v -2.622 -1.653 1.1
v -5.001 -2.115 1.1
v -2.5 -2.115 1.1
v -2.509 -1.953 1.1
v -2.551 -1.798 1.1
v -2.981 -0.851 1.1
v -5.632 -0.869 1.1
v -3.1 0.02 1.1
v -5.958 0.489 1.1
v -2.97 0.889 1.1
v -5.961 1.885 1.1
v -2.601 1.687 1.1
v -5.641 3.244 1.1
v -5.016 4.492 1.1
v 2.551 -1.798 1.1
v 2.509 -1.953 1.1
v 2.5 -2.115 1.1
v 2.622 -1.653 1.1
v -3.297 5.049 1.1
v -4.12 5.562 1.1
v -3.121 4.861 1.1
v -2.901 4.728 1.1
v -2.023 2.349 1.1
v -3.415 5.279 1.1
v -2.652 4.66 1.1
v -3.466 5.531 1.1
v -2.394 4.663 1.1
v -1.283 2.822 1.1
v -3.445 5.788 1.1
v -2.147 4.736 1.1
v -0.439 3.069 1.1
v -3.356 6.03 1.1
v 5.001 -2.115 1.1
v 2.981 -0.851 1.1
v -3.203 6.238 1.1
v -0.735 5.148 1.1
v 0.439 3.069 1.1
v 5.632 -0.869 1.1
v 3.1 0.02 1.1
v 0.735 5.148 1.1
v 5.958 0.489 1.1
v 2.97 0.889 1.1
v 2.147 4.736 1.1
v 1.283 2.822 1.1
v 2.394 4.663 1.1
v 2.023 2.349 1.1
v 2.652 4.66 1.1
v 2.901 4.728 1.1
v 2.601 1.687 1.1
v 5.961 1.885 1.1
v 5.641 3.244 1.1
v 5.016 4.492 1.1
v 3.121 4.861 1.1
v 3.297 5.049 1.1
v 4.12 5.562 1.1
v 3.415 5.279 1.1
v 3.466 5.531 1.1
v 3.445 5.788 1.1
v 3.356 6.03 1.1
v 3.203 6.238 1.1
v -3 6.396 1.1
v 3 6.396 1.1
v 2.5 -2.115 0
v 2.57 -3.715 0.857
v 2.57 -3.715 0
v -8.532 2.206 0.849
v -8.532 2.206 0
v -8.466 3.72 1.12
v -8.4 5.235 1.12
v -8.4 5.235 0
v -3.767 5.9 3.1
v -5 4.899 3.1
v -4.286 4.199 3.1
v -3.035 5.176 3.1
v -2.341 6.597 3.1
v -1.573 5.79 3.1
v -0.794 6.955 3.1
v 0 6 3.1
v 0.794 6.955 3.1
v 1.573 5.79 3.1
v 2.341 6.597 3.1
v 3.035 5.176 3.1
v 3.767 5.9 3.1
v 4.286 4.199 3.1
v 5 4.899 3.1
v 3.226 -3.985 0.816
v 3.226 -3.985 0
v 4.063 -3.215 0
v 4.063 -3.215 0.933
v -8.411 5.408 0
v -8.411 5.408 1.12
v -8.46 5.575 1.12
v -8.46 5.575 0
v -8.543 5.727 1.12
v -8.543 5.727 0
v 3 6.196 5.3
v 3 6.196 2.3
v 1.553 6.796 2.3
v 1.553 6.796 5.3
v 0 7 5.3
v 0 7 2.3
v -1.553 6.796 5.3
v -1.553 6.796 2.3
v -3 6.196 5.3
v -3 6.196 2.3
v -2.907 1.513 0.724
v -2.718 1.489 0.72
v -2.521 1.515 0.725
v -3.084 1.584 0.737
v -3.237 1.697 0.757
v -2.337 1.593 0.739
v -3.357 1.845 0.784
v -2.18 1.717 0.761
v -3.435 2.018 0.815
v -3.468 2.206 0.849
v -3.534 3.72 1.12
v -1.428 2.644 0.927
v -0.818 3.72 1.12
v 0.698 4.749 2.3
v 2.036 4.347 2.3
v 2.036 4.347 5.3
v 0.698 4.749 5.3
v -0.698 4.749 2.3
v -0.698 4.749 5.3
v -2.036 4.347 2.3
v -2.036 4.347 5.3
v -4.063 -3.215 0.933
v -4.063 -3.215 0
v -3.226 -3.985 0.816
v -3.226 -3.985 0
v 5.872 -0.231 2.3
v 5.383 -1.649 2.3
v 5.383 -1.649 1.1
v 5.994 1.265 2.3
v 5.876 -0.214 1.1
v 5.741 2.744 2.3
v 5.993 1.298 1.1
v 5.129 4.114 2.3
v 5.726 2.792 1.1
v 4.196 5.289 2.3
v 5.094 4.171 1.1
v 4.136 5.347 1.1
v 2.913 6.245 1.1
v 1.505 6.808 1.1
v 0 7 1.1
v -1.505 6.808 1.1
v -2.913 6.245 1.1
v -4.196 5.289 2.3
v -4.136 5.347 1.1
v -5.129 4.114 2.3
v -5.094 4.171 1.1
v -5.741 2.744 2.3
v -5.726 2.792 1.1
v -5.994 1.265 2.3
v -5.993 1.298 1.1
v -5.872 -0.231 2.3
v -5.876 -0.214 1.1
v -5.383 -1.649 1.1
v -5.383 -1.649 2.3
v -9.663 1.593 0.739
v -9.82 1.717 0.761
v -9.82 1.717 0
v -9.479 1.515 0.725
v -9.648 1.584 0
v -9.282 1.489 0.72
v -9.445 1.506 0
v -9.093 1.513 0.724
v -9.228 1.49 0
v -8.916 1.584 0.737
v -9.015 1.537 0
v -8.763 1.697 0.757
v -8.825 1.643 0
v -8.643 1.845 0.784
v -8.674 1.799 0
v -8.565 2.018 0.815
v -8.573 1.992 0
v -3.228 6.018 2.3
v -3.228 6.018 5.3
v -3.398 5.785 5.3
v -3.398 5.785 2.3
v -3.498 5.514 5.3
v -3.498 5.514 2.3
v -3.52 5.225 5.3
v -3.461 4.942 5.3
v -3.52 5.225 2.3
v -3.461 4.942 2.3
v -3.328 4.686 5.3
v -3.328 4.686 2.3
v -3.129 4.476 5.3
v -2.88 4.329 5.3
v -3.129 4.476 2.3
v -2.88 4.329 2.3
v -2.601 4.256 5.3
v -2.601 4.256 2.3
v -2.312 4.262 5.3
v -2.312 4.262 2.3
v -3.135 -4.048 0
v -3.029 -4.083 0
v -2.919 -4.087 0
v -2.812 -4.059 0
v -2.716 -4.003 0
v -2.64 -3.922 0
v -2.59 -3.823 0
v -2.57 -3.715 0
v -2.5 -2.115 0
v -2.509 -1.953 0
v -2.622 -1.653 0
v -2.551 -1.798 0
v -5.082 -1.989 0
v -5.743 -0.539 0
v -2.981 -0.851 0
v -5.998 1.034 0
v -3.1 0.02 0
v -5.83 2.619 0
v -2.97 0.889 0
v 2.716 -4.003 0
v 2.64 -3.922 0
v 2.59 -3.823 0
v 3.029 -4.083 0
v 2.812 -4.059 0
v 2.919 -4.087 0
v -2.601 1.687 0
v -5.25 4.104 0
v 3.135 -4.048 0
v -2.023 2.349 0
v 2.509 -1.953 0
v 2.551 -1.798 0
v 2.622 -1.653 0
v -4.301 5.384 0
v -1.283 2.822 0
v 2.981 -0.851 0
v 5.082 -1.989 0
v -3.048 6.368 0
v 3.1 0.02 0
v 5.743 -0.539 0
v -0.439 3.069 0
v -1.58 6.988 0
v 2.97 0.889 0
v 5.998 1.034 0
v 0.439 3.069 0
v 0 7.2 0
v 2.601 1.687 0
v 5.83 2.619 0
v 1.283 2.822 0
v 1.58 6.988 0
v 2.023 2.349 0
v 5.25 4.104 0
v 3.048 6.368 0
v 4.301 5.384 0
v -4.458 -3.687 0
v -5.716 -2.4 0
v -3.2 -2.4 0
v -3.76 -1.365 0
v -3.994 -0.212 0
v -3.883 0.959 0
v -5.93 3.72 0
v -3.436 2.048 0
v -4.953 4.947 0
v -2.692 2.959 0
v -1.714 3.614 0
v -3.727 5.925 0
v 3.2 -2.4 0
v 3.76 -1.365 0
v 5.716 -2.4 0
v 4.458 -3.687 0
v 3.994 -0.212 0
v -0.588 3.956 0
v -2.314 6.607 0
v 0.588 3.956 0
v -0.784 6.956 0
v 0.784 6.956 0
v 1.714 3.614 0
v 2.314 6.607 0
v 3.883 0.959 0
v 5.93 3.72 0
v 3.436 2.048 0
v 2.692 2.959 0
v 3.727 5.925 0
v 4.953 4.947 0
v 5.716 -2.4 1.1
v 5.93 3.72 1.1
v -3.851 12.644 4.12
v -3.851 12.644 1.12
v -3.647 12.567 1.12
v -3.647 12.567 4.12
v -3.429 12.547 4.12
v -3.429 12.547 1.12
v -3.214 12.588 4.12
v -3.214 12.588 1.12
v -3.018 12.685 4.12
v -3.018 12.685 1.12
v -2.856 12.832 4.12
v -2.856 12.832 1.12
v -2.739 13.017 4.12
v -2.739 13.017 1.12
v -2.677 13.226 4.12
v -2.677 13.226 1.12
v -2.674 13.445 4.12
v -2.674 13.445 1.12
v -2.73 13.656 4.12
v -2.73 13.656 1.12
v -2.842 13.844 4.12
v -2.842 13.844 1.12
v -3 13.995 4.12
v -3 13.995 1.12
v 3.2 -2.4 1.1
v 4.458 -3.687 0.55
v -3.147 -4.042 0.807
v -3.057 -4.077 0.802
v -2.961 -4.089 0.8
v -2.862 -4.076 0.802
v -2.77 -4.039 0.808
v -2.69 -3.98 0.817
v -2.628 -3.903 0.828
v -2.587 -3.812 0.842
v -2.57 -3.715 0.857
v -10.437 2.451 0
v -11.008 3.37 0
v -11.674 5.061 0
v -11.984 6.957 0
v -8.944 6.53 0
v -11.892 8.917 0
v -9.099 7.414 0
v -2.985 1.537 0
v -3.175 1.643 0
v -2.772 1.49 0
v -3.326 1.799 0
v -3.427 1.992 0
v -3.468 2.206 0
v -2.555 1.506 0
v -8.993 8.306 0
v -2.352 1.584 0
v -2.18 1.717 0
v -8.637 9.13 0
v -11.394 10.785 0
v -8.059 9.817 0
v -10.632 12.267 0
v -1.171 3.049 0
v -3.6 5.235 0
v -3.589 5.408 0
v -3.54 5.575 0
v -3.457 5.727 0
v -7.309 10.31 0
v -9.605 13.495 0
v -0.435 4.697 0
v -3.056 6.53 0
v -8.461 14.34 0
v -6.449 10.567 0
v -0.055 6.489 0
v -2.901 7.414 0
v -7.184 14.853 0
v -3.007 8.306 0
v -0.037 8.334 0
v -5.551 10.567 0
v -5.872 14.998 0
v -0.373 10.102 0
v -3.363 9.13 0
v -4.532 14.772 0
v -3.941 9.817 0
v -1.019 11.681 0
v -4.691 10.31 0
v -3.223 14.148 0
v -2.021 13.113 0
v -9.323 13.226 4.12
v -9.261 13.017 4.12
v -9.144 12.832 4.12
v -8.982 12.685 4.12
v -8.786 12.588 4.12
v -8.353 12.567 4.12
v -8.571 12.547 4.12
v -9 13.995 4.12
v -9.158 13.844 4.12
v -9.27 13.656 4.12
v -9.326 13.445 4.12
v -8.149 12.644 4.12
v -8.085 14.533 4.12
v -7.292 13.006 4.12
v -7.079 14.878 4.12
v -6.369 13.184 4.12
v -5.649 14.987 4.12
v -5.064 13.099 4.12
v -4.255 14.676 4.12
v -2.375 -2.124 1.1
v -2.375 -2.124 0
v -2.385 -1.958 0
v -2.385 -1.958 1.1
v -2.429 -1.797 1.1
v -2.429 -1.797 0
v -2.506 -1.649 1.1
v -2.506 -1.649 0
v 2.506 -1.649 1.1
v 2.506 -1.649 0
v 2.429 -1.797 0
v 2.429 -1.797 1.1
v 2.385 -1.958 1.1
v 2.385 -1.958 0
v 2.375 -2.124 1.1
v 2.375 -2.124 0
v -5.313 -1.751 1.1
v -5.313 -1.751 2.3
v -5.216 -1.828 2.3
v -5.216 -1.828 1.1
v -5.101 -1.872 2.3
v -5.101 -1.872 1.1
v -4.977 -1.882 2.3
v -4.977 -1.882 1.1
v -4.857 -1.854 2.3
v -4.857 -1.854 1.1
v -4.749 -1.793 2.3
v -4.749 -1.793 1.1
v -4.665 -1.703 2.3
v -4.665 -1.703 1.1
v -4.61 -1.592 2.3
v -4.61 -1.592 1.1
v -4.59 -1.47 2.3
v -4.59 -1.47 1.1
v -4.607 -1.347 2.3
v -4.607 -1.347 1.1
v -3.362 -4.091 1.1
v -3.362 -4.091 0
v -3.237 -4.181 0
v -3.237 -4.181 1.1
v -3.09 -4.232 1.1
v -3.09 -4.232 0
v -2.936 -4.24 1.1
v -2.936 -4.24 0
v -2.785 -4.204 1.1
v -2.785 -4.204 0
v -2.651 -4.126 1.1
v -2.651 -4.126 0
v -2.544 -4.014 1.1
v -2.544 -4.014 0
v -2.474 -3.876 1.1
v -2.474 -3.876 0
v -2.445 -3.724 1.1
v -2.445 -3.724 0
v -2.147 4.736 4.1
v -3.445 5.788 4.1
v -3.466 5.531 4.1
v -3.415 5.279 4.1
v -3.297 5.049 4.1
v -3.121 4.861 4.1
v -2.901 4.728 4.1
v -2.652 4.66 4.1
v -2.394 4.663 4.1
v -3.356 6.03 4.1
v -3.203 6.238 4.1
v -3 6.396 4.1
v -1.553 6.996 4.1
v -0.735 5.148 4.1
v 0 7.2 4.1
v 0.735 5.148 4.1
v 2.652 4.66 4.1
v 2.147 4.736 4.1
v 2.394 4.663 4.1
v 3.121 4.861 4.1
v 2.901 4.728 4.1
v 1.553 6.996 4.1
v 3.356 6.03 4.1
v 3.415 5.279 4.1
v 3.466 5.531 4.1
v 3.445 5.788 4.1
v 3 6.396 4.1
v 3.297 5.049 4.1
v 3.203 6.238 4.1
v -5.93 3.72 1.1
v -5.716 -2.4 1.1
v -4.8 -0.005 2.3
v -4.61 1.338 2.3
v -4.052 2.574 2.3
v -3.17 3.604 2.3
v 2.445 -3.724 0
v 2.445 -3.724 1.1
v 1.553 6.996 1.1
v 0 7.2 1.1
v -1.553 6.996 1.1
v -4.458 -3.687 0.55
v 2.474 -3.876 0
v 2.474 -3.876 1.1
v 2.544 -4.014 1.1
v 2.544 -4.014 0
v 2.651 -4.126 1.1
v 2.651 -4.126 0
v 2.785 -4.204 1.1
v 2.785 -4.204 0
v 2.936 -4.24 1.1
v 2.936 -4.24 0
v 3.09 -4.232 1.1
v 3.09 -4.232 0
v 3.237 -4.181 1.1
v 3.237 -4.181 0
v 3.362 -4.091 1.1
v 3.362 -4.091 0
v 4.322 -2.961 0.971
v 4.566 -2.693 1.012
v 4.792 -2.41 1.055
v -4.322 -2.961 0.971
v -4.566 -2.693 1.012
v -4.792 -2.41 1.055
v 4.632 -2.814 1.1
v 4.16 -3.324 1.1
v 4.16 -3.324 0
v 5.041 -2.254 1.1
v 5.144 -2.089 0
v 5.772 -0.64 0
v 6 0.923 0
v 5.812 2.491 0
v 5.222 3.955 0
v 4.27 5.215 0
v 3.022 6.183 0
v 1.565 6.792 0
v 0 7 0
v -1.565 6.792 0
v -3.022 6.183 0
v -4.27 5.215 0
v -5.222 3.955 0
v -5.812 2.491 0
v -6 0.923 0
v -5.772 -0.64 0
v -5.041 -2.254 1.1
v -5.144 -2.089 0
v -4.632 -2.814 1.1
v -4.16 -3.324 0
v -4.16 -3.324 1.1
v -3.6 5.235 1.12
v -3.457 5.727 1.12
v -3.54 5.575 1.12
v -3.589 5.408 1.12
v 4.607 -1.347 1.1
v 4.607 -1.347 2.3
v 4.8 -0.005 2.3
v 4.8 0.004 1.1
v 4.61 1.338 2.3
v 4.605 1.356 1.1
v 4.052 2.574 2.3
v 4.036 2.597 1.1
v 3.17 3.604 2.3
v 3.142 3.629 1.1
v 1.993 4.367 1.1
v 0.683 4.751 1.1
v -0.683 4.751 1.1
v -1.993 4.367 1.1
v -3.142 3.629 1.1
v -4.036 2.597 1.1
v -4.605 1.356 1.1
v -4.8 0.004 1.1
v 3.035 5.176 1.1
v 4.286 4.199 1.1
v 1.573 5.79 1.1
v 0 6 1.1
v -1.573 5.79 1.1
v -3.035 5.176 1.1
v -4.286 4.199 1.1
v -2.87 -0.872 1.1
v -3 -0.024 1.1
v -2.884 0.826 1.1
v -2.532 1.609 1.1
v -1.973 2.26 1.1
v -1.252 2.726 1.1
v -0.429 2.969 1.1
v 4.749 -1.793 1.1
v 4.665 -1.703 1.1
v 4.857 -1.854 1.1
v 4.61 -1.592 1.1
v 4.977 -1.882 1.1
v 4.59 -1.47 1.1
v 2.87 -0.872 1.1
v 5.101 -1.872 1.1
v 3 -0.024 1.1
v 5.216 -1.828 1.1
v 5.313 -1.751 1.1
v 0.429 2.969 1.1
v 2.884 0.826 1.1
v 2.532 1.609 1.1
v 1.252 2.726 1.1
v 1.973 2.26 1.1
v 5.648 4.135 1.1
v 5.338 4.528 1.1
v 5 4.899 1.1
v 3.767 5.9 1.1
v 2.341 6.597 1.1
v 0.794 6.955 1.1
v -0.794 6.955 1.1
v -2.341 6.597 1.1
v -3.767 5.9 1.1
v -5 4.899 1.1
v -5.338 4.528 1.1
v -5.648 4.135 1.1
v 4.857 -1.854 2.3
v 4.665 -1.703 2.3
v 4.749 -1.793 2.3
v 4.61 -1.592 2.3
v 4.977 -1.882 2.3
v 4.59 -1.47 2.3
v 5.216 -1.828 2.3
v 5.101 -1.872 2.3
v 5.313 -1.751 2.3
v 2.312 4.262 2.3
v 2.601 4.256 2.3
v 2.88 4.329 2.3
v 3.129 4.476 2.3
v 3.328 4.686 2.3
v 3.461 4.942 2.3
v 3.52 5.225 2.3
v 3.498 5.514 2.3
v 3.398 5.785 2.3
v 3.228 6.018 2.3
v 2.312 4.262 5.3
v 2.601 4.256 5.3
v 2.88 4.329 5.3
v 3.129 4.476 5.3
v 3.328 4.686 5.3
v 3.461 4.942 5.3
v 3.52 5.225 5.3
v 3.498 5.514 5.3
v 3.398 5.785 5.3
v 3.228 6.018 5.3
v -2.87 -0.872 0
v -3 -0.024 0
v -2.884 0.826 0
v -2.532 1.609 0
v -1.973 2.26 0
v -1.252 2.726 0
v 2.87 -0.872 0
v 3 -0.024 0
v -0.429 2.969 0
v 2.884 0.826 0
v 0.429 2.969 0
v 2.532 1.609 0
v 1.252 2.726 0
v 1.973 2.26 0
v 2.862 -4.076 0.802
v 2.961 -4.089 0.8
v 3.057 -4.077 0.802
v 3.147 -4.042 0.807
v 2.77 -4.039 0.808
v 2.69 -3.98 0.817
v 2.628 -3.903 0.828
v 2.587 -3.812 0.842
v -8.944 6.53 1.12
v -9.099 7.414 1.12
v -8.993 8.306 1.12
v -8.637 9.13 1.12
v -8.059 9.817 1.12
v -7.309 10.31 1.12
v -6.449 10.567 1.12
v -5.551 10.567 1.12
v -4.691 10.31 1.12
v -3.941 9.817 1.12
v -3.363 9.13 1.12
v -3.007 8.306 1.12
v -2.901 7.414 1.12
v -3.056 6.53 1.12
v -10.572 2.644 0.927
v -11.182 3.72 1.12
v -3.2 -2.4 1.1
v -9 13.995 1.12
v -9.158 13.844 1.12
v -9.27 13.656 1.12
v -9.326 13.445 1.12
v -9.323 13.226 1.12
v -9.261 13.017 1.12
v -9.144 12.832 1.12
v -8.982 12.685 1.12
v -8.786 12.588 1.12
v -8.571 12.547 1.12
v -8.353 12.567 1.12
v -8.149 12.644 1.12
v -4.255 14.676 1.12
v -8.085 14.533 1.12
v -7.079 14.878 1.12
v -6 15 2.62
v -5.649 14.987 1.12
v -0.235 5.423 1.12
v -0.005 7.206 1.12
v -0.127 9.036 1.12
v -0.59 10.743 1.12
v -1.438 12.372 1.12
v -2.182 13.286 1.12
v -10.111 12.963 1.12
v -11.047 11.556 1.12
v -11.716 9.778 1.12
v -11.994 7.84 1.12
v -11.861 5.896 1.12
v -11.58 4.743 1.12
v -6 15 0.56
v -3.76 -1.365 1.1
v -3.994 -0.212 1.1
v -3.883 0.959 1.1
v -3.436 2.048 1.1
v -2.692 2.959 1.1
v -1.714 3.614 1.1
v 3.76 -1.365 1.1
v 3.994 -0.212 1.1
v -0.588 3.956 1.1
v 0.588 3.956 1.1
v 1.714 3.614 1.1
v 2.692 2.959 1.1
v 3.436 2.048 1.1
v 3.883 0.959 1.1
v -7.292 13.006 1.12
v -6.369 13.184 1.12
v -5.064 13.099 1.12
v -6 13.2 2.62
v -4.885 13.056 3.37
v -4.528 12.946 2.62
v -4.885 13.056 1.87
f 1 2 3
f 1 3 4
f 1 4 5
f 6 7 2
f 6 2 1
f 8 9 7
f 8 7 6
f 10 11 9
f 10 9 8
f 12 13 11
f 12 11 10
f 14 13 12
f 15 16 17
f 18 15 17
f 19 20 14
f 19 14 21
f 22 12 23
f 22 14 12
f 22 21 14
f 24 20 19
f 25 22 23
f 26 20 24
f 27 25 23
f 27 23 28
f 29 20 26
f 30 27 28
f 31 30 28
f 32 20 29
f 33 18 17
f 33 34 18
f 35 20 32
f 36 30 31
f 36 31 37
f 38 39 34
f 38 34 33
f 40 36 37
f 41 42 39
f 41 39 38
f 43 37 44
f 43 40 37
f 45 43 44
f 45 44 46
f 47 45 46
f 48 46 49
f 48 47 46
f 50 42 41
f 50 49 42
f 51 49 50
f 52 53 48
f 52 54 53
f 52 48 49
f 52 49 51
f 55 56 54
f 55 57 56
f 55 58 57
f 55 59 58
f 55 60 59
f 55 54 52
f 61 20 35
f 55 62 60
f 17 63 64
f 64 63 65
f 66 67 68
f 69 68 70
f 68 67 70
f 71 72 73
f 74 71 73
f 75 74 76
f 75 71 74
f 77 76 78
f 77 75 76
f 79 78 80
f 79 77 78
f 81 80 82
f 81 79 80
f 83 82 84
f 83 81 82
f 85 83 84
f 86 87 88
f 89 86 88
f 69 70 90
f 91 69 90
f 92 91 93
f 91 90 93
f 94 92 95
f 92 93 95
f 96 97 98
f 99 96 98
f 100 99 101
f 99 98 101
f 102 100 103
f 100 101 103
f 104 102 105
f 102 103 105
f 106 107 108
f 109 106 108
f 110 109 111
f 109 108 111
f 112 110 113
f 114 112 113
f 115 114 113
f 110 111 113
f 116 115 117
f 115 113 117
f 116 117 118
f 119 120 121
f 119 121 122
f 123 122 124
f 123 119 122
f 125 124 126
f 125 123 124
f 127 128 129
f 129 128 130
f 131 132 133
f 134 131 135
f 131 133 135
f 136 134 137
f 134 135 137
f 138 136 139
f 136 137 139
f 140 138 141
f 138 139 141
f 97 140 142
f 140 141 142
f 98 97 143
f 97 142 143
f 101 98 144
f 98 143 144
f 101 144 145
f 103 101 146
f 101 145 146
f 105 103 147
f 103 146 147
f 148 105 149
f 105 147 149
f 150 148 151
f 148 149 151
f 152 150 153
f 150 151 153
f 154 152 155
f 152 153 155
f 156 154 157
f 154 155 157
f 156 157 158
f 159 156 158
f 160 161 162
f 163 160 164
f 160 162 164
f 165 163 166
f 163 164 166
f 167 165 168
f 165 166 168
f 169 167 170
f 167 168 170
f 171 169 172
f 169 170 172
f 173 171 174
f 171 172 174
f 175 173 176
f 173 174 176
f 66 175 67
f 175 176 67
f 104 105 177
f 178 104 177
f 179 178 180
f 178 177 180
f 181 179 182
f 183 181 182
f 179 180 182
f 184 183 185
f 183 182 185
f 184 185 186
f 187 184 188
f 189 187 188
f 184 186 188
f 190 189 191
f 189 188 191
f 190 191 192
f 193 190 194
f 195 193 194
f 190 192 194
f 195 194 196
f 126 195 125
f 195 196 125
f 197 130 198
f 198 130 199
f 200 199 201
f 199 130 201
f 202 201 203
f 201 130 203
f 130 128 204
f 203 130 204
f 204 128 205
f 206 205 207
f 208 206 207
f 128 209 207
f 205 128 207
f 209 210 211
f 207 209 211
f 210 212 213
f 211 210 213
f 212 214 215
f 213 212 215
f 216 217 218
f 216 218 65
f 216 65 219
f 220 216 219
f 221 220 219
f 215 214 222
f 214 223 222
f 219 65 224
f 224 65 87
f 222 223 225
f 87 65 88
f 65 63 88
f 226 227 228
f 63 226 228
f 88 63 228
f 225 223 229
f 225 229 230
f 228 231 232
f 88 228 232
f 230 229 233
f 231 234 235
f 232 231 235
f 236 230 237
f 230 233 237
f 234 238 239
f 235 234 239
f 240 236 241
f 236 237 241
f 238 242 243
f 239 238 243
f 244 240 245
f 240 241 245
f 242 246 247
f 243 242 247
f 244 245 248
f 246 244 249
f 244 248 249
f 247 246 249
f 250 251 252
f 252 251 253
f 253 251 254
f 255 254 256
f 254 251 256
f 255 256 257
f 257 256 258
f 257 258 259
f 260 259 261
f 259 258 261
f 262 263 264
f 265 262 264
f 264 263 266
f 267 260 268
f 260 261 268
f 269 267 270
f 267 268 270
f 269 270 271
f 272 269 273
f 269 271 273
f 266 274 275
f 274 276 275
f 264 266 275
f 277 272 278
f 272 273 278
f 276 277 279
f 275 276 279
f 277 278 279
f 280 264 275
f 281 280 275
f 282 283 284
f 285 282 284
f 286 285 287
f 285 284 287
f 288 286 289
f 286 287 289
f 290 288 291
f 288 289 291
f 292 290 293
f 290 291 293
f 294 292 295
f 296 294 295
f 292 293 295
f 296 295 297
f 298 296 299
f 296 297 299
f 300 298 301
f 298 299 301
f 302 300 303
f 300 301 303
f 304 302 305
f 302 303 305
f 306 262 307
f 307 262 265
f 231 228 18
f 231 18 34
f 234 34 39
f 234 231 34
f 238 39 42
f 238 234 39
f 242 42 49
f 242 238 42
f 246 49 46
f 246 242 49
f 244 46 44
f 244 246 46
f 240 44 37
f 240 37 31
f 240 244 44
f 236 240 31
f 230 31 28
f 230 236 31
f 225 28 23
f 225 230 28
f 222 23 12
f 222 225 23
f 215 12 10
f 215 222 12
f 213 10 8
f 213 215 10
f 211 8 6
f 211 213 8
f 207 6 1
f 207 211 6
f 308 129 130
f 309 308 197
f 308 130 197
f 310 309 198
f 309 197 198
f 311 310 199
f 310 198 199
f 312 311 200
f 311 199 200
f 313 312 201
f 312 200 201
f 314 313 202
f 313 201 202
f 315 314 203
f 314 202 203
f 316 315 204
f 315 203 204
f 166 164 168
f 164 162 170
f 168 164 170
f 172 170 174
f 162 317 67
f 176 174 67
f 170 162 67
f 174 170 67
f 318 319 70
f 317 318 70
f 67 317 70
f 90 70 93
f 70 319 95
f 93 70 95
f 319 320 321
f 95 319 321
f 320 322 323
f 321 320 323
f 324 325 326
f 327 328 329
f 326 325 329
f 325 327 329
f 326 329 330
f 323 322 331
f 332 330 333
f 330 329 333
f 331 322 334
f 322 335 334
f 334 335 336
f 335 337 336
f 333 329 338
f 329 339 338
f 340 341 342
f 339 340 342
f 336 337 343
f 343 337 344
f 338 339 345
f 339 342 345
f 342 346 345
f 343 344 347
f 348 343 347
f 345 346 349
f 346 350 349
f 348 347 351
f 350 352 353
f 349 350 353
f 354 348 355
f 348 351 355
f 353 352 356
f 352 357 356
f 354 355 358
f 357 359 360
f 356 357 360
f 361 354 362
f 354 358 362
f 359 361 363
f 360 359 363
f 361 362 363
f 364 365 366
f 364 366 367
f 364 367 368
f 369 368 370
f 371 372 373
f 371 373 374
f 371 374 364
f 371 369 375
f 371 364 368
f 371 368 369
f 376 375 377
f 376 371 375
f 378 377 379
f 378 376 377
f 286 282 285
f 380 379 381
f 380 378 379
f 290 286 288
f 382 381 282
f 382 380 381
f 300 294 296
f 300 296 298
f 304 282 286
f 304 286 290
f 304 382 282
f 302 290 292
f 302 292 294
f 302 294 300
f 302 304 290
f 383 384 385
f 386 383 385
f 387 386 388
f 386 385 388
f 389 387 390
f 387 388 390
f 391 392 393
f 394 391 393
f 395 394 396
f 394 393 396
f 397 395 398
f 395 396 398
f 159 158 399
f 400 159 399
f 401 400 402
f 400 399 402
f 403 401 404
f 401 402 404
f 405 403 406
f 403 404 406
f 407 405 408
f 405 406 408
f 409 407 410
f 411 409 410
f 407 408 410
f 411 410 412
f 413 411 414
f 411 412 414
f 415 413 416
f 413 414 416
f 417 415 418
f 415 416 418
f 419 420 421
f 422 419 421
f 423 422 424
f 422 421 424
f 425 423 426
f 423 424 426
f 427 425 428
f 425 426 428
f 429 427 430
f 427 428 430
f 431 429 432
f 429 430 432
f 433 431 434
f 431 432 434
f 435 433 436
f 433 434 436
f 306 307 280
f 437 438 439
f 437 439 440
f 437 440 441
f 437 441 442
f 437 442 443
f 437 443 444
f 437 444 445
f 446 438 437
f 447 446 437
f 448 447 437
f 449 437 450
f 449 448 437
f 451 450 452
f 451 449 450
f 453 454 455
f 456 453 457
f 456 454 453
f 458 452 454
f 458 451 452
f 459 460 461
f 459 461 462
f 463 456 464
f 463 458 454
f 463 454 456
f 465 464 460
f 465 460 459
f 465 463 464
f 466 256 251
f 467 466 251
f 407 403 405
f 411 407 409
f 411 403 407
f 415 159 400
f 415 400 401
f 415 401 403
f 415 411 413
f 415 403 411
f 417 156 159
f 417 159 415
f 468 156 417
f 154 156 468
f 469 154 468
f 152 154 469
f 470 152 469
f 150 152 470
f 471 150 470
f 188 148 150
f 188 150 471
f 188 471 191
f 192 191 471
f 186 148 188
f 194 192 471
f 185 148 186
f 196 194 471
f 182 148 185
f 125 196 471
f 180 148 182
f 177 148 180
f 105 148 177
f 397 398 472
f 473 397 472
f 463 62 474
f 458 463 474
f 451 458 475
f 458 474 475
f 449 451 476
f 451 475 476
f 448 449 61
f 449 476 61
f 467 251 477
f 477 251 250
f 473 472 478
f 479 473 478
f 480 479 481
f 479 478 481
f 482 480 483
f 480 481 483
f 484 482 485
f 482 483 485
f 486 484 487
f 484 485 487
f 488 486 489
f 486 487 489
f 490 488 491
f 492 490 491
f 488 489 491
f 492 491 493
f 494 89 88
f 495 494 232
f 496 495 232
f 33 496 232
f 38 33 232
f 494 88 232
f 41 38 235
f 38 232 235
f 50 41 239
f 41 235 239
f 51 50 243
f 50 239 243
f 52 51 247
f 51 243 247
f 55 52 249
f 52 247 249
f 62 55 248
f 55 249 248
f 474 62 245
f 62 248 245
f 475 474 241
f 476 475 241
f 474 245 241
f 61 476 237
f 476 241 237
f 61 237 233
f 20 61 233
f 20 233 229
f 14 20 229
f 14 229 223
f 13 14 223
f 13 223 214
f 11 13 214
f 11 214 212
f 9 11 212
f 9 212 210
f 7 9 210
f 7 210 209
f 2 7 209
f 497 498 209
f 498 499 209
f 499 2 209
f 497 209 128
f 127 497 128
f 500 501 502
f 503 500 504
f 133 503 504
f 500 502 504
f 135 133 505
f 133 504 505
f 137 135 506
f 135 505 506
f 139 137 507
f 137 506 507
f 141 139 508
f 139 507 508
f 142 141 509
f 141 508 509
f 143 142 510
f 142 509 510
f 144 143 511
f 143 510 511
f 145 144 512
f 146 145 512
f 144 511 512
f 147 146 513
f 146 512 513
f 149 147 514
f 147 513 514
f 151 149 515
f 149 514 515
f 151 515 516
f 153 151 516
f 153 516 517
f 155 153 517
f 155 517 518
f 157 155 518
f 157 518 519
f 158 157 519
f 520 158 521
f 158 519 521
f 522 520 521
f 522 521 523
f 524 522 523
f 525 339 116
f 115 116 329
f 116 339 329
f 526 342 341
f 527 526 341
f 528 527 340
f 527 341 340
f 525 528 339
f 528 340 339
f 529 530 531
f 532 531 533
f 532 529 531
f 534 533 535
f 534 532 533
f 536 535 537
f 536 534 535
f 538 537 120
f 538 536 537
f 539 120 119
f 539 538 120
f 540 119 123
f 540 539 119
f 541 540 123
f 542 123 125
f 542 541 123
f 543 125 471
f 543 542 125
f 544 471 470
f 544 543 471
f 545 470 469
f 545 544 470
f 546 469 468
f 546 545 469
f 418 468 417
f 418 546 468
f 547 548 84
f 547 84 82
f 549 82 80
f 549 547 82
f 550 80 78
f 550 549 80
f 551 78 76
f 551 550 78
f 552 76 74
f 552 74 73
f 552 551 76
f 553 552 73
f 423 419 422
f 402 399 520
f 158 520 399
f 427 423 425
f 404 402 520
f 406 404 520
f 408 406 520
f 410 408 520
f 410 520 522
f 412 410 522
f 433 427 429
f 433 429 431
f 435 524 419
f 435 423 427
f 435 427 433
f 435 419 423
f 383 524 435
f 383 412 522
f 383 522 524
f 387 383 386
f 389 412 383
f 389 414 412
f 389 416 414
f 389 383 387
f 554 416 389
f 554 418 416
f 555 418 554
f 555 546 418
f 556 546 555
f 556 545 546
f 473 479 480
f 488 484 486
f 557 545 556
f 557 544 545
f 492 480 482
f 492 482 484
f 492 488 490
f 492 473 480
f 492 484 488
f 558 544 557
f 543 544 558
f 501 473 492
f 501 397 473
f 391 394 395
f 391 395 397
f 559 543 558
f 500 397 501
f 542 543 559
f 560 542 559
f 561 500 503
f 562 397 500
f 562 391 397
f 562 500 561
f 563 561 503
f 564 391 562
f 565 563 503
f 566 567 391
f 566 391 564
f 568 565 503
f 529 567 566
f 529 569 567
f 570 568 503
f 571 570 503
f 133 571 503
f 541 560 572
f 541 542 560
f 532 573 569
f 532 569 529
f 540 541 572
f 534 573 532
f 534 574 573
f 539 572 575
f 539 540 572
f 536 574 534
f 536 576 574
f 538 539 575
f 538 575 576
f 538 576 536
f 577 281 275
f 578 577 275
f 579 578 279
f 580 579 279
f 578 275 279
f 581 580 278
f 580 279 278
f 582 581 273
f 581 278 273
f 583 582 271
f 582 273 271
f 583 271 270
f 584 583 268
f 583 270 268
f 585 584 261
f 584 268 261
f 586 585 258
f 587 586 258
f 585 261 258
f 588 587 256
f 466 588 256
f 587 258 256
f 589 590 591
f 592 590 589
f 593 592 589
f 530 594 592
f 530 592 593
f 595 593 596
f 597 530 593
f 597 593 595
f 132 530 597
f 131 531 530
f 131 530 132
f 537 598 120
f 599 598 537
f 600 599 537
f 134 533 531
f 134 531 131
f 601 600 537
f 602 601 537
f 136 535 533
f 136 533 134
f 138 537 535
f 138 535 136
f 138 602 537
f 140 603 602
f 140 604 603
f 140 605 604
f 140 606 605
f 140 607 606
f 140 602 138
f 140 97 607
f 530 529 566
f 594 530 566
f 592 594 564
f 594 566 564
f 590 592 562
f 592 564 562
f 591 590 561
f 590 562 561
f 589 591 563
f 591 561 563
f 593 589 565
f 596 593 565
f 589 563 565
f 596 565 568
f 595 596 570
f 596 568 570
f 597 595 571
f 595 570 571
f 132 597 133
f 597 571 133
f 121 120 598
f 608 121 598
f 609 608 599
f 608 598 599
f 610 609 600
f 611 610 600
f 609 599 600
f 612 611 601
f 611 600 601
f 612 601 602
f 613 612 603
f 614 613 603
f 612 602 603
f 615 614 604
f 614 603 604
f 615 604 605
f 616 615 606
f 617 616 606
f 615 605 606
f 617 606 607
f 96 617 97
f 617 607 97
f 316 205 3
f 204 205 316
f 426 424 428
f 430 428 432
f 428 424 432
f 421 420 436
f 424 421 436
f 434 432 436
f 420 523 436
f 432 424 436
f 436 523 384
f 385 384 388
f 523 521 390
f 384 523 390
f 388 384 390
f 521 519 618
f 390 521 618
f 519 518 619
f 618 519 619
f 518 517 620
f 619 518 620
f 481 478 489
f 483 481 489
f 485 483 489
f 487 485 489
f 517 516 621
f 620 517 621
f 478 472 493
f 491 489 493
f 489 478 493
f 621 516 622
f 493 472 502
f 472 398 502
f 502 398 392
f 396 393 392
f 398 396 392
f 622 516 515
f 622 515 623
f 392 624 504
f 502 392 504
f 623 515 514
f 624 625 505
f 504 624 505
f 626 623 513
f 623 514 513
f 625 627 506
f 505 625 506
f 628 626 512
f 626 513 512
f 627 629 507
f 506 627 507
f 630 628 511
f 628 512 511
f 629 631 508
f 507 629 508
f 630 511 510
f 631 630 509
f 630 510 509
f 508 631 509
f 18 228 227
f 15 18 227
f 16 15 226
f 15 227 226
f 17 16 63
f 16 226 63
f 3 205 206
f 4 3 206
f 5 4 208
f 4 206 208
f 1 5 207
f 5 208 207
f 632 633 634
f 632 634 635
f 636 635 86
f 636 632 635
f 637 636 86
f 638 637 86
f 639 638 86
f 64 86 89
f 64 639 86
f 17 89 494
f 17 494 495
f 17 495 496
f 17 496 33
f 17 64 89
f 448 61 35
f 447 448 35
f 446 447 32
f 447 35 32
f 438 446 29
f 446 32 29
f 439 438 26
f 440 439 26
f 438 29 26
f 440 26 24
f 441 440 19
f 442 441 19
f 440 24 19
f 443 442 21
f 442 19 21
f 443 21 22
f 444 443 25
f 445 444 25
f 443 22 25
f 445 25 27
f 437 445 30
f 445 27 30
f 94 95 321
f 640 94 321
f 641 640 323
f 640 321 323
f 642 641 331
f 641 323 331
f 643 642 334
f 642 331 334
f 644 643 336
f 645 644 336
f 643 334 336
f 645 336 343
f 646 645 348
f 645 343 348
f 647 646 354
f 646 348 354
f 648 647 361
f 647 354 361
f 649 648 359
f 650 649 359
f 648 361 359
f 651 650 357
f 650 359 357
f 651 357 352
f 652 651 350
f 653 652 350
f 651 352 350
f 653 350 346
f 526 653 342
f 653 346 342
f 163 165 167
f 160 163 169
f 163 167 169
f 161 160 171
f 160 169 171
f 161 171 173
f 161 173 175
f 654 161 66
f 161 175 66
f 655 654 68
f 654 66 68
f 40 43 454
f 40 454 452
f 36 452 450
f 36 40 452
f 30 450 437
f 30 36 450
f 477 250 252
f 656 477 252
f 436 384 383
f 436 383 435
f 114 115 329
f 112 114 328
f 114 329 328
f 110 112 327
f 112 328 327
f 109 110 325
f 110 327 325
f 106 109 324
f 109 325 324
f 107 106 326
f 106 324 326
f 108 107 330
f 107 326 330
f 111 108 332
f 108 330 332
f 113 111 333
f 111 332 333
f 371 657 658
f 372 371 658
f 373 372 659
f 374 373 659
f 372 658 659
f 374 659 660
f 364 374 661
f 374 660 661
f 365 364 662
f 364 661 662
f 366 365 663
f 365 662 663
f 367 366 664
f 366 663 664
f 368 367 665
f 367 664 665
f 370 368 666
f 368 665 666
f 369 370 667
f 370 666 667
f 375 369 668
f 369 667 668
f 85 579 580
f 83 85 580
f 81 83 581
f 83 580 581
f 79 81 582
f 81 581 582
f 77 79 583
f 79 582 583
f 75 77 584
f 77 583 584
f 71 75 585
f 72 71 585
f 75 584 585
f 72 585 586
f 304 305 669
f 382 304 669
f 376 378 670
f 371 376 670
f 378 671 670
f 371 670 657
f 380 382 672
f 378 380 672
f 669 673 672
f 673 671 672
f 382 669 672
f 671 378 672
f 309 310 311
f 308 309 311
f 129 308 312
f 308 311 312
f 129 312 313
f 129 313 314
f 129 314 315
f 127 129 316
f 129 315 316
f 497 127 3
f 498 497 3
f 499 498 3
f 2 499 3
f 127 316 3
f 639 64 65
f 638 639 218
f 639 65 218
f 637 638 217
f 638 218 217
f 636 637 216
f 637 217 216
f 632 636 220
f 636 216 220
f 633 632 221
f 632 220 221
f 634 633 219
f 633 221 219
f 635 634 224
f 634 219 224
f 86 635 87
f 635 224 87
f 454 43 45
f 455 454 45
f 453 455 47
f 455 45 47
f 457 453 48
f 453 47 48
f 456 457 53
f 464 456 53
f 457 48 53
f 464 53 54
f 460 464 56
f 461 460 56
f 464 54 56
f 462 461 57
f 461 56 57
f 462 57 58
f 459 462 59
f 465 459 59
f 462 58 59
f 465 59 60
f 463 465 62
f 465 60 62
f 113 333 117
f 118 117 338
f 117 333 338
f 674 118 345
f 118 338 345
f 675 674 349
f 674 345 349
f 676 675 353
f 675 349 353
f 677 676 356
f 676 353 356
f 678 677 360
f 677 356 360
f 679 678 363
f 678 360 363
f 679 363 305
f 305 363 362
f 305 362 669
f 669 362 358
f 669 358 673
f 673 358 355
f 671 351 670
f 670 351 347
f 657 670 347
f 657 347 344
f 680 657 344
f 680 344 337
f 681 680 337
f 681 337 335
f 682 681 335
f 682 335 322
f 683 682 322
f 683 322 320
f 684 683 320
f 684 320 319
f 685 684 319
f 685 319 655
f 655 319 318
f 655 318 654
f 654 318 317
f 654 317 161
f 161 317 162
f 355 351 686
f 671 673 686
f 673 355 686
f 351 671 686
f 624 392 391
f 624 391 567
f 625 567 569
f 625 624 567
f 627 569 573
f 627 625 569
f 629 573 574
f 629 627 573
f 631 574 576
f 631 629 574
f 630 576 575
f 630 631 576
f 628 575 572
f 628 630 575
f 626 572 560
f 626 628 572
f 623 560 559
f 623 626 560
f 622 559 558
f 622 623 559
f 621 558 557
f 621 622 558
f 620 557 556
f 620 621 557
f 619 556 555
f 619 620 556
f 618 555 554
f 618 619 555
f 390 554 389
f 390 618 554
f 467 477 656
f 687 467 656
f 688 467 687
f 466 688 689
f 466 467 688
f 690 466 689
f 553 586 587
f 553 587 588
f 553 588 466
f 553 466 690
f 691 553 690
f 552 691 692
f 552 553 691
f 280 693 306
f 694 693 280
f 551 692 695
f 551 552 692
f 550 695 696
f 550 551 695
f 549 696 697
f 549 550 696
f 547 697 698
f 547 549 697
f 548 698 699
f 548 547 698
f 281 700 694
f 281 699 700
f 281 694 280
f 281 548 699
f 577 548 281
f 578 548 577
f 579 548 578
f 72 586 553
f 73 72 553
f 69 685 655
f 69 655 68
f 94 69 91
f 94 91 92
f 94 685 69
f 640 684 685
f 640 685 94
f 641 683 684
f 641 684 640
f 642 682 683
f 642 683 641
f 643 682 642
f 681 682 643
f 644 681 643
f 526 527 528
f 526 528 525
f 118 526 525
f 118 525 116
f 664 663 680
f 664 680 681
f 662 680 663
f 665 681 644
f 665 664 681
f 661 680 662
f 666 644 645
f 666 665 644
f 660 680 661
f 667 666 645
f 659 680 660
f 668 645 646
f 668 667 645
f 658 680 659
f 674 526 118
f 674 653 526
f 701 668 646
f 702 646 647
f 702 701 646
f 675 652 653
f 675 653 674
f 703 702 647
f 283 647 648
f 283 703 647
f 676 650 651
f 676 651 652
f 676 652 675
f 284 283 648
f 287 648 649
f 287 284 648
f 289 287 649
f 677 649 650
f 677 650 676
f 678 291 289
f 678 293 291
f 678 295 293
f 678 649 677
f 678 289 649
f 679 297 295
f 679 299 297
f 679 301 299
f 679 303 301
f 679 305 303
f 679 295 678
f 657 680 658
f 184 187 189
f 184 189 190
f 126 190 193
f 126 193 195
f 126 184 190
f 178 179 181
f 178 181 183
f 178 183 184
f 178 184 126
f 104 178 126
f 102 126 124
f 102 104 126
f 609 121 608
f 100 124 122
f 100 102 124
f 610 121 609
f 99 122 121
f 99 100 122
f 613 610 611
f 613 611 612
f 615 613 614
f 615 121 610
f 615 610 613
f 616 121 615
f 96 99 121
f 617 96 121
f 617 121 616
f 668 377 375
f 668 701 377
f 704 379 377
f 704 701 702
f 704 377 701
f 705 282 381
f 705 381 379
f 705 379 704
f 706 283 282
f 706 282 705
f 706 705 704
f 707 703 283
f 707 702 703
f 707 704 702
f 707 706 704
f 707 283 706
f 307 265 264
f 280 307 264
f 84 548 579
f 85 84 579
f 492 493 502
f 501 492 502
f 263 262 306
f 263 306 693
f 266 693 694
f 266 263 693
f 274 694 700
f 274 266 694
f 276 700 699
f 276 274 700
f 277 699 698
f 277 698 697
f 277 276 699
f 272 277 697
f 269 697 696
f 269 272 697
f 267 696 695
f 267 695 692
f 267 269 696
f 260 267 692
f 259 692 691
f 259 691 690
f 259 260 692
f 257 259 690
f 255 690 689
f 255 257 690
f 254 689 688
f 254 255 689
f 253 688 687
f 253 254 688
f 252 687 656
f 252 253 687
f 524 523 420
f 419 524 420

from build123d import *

# Parameters (mm, degrees)
PAD_DEPTH            = 1.1
PAD001_DEPTH         = 1.2
PAD002_DEPTH         = 3
PAD003_DEPTH         = 1.1
PAD004_DEPTH         = 3
POCKET_DEPTH         = 6.001
POCKET_DEPTH_BACK    = 6.001
PAD005_DEPTH         = 1.12
PAD006_DEPTH         = 3
POCKET001_DEPTH      = 12.001
POCKET001_DEPTH_BACK = 0.001
PAD007_DEPTH         = 1.1
PAD008_DEPTH         = 2
POCKET002_DEPTH      = 5.9308955855
POCKET002_DEPTH_BACK = 5.9308955855


with BuildPart() as body:
    # Sketch001 → Pad (new body)
    with BuildSketch(Plane.XY):
        with BuildLine():
            ThreePointArc((-3.3623760191, -4.0910299298), (-2.7851214881, -4.2036886405), (-2.4448575087, -3.7239645501))
            Line((-2.375, -2.1239645501), (-2.4448575087, -3.7239645501))
            ThreePointArc((-2.375, -2.1239645501), (-2.4030554088, -1.8762862386), (-2.5059778242, -1.6492650317))
            ThreePointArc((2.5059778241, -1.6492650317), (0, 3), (-2.5059778242, -1.6492650317))
            ThreePointArc((2.5059778241, -1.6492650317), (2.4030554088, -1.8762862386), (2.375, -2.1239645501))
            Line((2.375, -2.1239645501), (2.4448575087, -3.7239645501))
            ThreePointArc((2.4448575087, -3.7239645501), (2.7851214881, -4.2036886404), (3.362376019, -4.0910299297))
            Line((3.362376019, -4.0910299297), (4.159727223, -3.3239645501))
            ThreePointArc((4.159727223, -3.3239645501), (0, 7), (-4.159727223, -3.3239645501))
            Line((-4.159727223, -3.3239645501), (-3.3623760191, -4.0910299298))
        make_face()
    extrude(amount=PAD_DEPTH)

    # Sketch002 → Pad001 (join)
    with BuildSketch(Plane.XY.offset(1.1)):
        with BuildLine():
            ThreePointArc((5.3834370798, -1.6492650317), (0, 7), (-5.3834370798, -1.6492650317))
            ThreePointArc((-5.3834370797, -1.6492650317), (-4.8567694559, -1.8543164722), (-4.6070336858, -1.3473086572))
            ThreePointArc((4.6070336858, -1.3473086572), (0, 4.8), (-4.6070336858, -1.3473086572))
            ThreePointArc((4.6070336858, -1.3473086572), (4.8567694559, -1.8543164722), (5.3834370797, -1.6492650317))
        make_face()
    extrude(amount=PAD001_DEPTH)

    # Sketch003 → Pad002 (join)
    with BuildSketch(Plane.XY.offset(2.3)):
        with BuildLine():
            ThreePointArc((-3, 6.1961524227), (-3.4035480565, 4.8095776308), (-2.0355250412, 4.3470263177))
            ThreePointArc((2.0355250412, 4.3470263177), (0, 4.8), (-2.0355250412, 4.3470263177))
            ThreePointArc((2.0355250412, 4.3470263177), (3.4035480565, 4.8095776308), (3, 6.1961524227))
            ThreePointArc((3, 6.1961524227), (0, 7), (-3, 6.1961524227))
        make_face()
    extrude(amount=PAD002_DEPTH)


with BuildPart() as body001:
    # Sketch005 → Pad003 (new body)
    with BuildSketch(Plane.XY):
        with BuildLine():
            ThreePointArc((-3.2259399201, -3.9854618904), (-2.8115017402, -4.0592572787), (-2.5698575087, -3.7145649092))
            Line((-2.5, -2.1145649092), (-2.5698575087, -3.7145649092))
            ThreePointArc((-2.5, -2.1145649092), (-2.526003623, -1.8744677776), (-2.6224716896, -1.6530705482))
            ThreePointArc((2.6224716896, -1.6530705482), (0, 3.1), (-2.6224716896, -1.6530705482))
            ThreePointArc((2.6224716896, -1.6530705482), (2.526003623, -1.8744677776), (2.5, -2.1145649092))
            Line((2.5, -2.1145649092), (2.5698575086, -3.7145649092))
            ThreePointArc((2.5698575086, -3.7145649092), (2.8115017402, -4.0592572787), (3.2259399201, -3.9854618904))
            Line((3.2259399201, -3.9854618904), (4.063448863, -3.2145649092))
            ThreePointArc((4.063448863, -3.2145649092), (0, 7.2), (-4.063448863, -3.2145649092))
            Line((-4.063448863, -3.2145649092), (-3.2259399201, -3.9854618904))
        make_face()
    extrude(amount=PAD003_DEPTH)

    # Sketch006 → Pad004 (join)
    with BuildSketch(Plane.XY.offset(1.1)):
        with BuildLine():
            ThreePointArc((-3, 6.3961524227), (-3.3638890962, 5.1600240702), (-2.1470608433, 4.736045791))
            ThreePointArc((2.1470608433, 4.7360457911), (0, 5.2), (-2.1470608433, 4.7360457911))
            ThreePointArc((2.1470608433, 4.736045791), (3.3638890962, 5.1600240702), (3, 6.3961524227))
            ThreePointArc((3, 6.3961524227), (0, 7.2), (-3, 6.3961524227))
        make_face()
    extrude(amount=PAD004_DEPTH)

    # Sketch007 → Pocket (cut, two sides)
    with BuildSketch(Plane.YZ) as pocket_sk:
        Polygon((-2.1145649092, 1.1), (-4.088882367, 1.1), (-4.088882367, 0.8), align=None)
    extrude(amount=-POCKET_DEPTH, mode=Mode.SUBTRACT)
    extrude(pocket_sk.sketch, amount=POCKET_DEPTH_BACK, mode=Mode.SUBTRACT)


with BuildPart() as body002:
    # Sketch009 → Pad005 (new body)
    with BuildSketch(Plane.XY):
        with BuildLine():
            ThreePointArc((-3.4570154899, 5.7270843841), (-3.5690286911, 5.4926393827), (-3.6, 5.2346622636))
            Line((-3.6, 5.2346622636), (-3.4677572031, 2.2058042473))
            ThreePointArc((-3.4677572031, 2.2058042473), (-2.984770714, 1.5373879284), (-2.1798308391, 1.7166311204))
            add(Edge.make_bspline(
                [(-2.1798308391, 1.7166311204), (10.6904050416, 15), (-6, 15), (-22.6904050416, 15), (-9.8201691609, 1.7166311204)],
                knots=[3.8317971165, 3.8317971165, 3.8317971165, 6.2831853072, 6.2831853072, 8.7345734978, 8.7345734978, 8.7345734978], degree=2, weights=[1, 0.338292883, 1, 0.338292883, 1]))
            ThreePointArc((-9.8201691609, 1.7166311204), (-9.015229286, 1.5373879284), (-8.5322427969, 2.2058042473))
            Line((-8.5322427969, 2.2058042473), (-8.4, 5.2346622636))
            ThreePointArc((-8.4, 5.2346622636), (-8.4309713089, 5.4926393827), (-8.5429845101, 5.7270843841))
            ThreePointArc((-8.5429845101, 5.7270843841), (-6, 10.6), (-3.4570154899, 5.7270843841))
        make_face()
    extrude(amount=PAD005_DEPTH)

    # Sketch010 → Pad006 (join)
    with BuildSketch(Plane.XY.offset(1.12)):
        with BuildLine():
            ThreePointArc((-3.8511770379, 12.6441284155), (-2.7912931609, 12.9200496843), (-3, 13.9951905284))
            add(Edge.make_bspline(
                [(-3, 13.9951905284), (-6, 16.1602540378), (-9, 13.9951905284)],
                knots=[5.7595865316, 5.7595865316, 5.7595865316, 6.8067840828, 6.8067840828, 6.8067840828], degree=2, weights=[1, 0.8660254038, 1]))
            ThreePointArc((-9, 13.9951905284), (-9.2087068391, 12.9200496843), (-8.1488229621, 12.6441284155))
            add(Edge.make_bspline(
                [(-3.8511770379, 12.6441284155), (-6, 13.815938751), (-8.1488229621, 12.6441284155)],
                knots=[5.8378787648, 5.8378787648, 5.8378787648, 6.7284918496, 6.7284918496, 6.7284918496], degree=2, weights=[1, 0.9024786694, 1]))
        make_face()
    extrude(amount=PAD006_DEPTH)

    # Sketch011 → Pocket001 (cut, two sides)
    with BuildSketch(Plane.YZ) as pocket001_sk:
        Polygon((3.7202332554, 1.12), (1.4885187878, 1.12), (1.4885187878, 0.72), align=None)
    extrude(amount=-POCKET001_DEPTH, mode=Mode.SUBTRACT)
    extrude(pocket001_sk.sketch, amount=POCKET001_DEPTH_BACK, mode=Mode.SUBTRACT)


with BuildPart() as body003:
    # Sketch013 → Pad007 (new body)
    with BuildSketch(Plane.XY):
        with BuildLine():
            ThreePointArc((5.9298955855, 3.7197228856), (0, 7.0000000001), (-5.9298955855, 3.7197228856))
            Line((-5.9298955855, 3.7197228856), (-5.7161901532, -2.4))
            Line((-5.7161901532, -2.4), (-4.4580950766, -3.687321552))
            Line((-4.4580950766, -3.687321552), (-3.2, -2.4))
            ThreePointArc((3.2, -2.4), (0, 4.0000000001), (-3.2, -2.4))
            Line((3.2, -2.4), (4.4580950766, -3.687321552))
            Line((4.4580950766, -3.687321552), (5.7161901533, -2.4))
            Line((5.7161901533, -2.4), (5.9298955855, 3.7197228856))
        make_face()
    extrude(amount=PAD007_DEPTH)

    # Sketch014 → Pad008 (join)
    with BuildSketch(Plane.XY.offset(1.1)):
        with BuildLine():
            ThreePointArc((5, 4.8989794856), (0, 7), (-5, 4.8989794856))
            Line((-5, 4.8989794856), (-4.2857142857, 4.1991252733))
            ThreePointArc((4.2857142857, 4.1991252733), (0, 6), (-4.2857142857, 4.1991252733))
            Line((4.2857142857, 4.1991252733), (5, 4.8989794856))
        make_face()
    extrude(amount=PAD008_DEPTH)

    # Sketch015 → Pocket002 (cut, two sides)
    with BuildSketch(Plane.YZ) as pocket002_sk:
        Polygon((-2.4, 1.1), (-3.687321552, 1.1), (-3.687321552, 0.55), align=None)
    extrude(amount=-POCKET002_DEPTH, mode=Mode.SUBTRACT)
    extrude(pocket002_sk.sketch, amount=POCKET002_DEPTH_BACK, mode=Mode.SUBTRACT)


solid = Compound([body.part, body001.part, body002.part, body003.part])
